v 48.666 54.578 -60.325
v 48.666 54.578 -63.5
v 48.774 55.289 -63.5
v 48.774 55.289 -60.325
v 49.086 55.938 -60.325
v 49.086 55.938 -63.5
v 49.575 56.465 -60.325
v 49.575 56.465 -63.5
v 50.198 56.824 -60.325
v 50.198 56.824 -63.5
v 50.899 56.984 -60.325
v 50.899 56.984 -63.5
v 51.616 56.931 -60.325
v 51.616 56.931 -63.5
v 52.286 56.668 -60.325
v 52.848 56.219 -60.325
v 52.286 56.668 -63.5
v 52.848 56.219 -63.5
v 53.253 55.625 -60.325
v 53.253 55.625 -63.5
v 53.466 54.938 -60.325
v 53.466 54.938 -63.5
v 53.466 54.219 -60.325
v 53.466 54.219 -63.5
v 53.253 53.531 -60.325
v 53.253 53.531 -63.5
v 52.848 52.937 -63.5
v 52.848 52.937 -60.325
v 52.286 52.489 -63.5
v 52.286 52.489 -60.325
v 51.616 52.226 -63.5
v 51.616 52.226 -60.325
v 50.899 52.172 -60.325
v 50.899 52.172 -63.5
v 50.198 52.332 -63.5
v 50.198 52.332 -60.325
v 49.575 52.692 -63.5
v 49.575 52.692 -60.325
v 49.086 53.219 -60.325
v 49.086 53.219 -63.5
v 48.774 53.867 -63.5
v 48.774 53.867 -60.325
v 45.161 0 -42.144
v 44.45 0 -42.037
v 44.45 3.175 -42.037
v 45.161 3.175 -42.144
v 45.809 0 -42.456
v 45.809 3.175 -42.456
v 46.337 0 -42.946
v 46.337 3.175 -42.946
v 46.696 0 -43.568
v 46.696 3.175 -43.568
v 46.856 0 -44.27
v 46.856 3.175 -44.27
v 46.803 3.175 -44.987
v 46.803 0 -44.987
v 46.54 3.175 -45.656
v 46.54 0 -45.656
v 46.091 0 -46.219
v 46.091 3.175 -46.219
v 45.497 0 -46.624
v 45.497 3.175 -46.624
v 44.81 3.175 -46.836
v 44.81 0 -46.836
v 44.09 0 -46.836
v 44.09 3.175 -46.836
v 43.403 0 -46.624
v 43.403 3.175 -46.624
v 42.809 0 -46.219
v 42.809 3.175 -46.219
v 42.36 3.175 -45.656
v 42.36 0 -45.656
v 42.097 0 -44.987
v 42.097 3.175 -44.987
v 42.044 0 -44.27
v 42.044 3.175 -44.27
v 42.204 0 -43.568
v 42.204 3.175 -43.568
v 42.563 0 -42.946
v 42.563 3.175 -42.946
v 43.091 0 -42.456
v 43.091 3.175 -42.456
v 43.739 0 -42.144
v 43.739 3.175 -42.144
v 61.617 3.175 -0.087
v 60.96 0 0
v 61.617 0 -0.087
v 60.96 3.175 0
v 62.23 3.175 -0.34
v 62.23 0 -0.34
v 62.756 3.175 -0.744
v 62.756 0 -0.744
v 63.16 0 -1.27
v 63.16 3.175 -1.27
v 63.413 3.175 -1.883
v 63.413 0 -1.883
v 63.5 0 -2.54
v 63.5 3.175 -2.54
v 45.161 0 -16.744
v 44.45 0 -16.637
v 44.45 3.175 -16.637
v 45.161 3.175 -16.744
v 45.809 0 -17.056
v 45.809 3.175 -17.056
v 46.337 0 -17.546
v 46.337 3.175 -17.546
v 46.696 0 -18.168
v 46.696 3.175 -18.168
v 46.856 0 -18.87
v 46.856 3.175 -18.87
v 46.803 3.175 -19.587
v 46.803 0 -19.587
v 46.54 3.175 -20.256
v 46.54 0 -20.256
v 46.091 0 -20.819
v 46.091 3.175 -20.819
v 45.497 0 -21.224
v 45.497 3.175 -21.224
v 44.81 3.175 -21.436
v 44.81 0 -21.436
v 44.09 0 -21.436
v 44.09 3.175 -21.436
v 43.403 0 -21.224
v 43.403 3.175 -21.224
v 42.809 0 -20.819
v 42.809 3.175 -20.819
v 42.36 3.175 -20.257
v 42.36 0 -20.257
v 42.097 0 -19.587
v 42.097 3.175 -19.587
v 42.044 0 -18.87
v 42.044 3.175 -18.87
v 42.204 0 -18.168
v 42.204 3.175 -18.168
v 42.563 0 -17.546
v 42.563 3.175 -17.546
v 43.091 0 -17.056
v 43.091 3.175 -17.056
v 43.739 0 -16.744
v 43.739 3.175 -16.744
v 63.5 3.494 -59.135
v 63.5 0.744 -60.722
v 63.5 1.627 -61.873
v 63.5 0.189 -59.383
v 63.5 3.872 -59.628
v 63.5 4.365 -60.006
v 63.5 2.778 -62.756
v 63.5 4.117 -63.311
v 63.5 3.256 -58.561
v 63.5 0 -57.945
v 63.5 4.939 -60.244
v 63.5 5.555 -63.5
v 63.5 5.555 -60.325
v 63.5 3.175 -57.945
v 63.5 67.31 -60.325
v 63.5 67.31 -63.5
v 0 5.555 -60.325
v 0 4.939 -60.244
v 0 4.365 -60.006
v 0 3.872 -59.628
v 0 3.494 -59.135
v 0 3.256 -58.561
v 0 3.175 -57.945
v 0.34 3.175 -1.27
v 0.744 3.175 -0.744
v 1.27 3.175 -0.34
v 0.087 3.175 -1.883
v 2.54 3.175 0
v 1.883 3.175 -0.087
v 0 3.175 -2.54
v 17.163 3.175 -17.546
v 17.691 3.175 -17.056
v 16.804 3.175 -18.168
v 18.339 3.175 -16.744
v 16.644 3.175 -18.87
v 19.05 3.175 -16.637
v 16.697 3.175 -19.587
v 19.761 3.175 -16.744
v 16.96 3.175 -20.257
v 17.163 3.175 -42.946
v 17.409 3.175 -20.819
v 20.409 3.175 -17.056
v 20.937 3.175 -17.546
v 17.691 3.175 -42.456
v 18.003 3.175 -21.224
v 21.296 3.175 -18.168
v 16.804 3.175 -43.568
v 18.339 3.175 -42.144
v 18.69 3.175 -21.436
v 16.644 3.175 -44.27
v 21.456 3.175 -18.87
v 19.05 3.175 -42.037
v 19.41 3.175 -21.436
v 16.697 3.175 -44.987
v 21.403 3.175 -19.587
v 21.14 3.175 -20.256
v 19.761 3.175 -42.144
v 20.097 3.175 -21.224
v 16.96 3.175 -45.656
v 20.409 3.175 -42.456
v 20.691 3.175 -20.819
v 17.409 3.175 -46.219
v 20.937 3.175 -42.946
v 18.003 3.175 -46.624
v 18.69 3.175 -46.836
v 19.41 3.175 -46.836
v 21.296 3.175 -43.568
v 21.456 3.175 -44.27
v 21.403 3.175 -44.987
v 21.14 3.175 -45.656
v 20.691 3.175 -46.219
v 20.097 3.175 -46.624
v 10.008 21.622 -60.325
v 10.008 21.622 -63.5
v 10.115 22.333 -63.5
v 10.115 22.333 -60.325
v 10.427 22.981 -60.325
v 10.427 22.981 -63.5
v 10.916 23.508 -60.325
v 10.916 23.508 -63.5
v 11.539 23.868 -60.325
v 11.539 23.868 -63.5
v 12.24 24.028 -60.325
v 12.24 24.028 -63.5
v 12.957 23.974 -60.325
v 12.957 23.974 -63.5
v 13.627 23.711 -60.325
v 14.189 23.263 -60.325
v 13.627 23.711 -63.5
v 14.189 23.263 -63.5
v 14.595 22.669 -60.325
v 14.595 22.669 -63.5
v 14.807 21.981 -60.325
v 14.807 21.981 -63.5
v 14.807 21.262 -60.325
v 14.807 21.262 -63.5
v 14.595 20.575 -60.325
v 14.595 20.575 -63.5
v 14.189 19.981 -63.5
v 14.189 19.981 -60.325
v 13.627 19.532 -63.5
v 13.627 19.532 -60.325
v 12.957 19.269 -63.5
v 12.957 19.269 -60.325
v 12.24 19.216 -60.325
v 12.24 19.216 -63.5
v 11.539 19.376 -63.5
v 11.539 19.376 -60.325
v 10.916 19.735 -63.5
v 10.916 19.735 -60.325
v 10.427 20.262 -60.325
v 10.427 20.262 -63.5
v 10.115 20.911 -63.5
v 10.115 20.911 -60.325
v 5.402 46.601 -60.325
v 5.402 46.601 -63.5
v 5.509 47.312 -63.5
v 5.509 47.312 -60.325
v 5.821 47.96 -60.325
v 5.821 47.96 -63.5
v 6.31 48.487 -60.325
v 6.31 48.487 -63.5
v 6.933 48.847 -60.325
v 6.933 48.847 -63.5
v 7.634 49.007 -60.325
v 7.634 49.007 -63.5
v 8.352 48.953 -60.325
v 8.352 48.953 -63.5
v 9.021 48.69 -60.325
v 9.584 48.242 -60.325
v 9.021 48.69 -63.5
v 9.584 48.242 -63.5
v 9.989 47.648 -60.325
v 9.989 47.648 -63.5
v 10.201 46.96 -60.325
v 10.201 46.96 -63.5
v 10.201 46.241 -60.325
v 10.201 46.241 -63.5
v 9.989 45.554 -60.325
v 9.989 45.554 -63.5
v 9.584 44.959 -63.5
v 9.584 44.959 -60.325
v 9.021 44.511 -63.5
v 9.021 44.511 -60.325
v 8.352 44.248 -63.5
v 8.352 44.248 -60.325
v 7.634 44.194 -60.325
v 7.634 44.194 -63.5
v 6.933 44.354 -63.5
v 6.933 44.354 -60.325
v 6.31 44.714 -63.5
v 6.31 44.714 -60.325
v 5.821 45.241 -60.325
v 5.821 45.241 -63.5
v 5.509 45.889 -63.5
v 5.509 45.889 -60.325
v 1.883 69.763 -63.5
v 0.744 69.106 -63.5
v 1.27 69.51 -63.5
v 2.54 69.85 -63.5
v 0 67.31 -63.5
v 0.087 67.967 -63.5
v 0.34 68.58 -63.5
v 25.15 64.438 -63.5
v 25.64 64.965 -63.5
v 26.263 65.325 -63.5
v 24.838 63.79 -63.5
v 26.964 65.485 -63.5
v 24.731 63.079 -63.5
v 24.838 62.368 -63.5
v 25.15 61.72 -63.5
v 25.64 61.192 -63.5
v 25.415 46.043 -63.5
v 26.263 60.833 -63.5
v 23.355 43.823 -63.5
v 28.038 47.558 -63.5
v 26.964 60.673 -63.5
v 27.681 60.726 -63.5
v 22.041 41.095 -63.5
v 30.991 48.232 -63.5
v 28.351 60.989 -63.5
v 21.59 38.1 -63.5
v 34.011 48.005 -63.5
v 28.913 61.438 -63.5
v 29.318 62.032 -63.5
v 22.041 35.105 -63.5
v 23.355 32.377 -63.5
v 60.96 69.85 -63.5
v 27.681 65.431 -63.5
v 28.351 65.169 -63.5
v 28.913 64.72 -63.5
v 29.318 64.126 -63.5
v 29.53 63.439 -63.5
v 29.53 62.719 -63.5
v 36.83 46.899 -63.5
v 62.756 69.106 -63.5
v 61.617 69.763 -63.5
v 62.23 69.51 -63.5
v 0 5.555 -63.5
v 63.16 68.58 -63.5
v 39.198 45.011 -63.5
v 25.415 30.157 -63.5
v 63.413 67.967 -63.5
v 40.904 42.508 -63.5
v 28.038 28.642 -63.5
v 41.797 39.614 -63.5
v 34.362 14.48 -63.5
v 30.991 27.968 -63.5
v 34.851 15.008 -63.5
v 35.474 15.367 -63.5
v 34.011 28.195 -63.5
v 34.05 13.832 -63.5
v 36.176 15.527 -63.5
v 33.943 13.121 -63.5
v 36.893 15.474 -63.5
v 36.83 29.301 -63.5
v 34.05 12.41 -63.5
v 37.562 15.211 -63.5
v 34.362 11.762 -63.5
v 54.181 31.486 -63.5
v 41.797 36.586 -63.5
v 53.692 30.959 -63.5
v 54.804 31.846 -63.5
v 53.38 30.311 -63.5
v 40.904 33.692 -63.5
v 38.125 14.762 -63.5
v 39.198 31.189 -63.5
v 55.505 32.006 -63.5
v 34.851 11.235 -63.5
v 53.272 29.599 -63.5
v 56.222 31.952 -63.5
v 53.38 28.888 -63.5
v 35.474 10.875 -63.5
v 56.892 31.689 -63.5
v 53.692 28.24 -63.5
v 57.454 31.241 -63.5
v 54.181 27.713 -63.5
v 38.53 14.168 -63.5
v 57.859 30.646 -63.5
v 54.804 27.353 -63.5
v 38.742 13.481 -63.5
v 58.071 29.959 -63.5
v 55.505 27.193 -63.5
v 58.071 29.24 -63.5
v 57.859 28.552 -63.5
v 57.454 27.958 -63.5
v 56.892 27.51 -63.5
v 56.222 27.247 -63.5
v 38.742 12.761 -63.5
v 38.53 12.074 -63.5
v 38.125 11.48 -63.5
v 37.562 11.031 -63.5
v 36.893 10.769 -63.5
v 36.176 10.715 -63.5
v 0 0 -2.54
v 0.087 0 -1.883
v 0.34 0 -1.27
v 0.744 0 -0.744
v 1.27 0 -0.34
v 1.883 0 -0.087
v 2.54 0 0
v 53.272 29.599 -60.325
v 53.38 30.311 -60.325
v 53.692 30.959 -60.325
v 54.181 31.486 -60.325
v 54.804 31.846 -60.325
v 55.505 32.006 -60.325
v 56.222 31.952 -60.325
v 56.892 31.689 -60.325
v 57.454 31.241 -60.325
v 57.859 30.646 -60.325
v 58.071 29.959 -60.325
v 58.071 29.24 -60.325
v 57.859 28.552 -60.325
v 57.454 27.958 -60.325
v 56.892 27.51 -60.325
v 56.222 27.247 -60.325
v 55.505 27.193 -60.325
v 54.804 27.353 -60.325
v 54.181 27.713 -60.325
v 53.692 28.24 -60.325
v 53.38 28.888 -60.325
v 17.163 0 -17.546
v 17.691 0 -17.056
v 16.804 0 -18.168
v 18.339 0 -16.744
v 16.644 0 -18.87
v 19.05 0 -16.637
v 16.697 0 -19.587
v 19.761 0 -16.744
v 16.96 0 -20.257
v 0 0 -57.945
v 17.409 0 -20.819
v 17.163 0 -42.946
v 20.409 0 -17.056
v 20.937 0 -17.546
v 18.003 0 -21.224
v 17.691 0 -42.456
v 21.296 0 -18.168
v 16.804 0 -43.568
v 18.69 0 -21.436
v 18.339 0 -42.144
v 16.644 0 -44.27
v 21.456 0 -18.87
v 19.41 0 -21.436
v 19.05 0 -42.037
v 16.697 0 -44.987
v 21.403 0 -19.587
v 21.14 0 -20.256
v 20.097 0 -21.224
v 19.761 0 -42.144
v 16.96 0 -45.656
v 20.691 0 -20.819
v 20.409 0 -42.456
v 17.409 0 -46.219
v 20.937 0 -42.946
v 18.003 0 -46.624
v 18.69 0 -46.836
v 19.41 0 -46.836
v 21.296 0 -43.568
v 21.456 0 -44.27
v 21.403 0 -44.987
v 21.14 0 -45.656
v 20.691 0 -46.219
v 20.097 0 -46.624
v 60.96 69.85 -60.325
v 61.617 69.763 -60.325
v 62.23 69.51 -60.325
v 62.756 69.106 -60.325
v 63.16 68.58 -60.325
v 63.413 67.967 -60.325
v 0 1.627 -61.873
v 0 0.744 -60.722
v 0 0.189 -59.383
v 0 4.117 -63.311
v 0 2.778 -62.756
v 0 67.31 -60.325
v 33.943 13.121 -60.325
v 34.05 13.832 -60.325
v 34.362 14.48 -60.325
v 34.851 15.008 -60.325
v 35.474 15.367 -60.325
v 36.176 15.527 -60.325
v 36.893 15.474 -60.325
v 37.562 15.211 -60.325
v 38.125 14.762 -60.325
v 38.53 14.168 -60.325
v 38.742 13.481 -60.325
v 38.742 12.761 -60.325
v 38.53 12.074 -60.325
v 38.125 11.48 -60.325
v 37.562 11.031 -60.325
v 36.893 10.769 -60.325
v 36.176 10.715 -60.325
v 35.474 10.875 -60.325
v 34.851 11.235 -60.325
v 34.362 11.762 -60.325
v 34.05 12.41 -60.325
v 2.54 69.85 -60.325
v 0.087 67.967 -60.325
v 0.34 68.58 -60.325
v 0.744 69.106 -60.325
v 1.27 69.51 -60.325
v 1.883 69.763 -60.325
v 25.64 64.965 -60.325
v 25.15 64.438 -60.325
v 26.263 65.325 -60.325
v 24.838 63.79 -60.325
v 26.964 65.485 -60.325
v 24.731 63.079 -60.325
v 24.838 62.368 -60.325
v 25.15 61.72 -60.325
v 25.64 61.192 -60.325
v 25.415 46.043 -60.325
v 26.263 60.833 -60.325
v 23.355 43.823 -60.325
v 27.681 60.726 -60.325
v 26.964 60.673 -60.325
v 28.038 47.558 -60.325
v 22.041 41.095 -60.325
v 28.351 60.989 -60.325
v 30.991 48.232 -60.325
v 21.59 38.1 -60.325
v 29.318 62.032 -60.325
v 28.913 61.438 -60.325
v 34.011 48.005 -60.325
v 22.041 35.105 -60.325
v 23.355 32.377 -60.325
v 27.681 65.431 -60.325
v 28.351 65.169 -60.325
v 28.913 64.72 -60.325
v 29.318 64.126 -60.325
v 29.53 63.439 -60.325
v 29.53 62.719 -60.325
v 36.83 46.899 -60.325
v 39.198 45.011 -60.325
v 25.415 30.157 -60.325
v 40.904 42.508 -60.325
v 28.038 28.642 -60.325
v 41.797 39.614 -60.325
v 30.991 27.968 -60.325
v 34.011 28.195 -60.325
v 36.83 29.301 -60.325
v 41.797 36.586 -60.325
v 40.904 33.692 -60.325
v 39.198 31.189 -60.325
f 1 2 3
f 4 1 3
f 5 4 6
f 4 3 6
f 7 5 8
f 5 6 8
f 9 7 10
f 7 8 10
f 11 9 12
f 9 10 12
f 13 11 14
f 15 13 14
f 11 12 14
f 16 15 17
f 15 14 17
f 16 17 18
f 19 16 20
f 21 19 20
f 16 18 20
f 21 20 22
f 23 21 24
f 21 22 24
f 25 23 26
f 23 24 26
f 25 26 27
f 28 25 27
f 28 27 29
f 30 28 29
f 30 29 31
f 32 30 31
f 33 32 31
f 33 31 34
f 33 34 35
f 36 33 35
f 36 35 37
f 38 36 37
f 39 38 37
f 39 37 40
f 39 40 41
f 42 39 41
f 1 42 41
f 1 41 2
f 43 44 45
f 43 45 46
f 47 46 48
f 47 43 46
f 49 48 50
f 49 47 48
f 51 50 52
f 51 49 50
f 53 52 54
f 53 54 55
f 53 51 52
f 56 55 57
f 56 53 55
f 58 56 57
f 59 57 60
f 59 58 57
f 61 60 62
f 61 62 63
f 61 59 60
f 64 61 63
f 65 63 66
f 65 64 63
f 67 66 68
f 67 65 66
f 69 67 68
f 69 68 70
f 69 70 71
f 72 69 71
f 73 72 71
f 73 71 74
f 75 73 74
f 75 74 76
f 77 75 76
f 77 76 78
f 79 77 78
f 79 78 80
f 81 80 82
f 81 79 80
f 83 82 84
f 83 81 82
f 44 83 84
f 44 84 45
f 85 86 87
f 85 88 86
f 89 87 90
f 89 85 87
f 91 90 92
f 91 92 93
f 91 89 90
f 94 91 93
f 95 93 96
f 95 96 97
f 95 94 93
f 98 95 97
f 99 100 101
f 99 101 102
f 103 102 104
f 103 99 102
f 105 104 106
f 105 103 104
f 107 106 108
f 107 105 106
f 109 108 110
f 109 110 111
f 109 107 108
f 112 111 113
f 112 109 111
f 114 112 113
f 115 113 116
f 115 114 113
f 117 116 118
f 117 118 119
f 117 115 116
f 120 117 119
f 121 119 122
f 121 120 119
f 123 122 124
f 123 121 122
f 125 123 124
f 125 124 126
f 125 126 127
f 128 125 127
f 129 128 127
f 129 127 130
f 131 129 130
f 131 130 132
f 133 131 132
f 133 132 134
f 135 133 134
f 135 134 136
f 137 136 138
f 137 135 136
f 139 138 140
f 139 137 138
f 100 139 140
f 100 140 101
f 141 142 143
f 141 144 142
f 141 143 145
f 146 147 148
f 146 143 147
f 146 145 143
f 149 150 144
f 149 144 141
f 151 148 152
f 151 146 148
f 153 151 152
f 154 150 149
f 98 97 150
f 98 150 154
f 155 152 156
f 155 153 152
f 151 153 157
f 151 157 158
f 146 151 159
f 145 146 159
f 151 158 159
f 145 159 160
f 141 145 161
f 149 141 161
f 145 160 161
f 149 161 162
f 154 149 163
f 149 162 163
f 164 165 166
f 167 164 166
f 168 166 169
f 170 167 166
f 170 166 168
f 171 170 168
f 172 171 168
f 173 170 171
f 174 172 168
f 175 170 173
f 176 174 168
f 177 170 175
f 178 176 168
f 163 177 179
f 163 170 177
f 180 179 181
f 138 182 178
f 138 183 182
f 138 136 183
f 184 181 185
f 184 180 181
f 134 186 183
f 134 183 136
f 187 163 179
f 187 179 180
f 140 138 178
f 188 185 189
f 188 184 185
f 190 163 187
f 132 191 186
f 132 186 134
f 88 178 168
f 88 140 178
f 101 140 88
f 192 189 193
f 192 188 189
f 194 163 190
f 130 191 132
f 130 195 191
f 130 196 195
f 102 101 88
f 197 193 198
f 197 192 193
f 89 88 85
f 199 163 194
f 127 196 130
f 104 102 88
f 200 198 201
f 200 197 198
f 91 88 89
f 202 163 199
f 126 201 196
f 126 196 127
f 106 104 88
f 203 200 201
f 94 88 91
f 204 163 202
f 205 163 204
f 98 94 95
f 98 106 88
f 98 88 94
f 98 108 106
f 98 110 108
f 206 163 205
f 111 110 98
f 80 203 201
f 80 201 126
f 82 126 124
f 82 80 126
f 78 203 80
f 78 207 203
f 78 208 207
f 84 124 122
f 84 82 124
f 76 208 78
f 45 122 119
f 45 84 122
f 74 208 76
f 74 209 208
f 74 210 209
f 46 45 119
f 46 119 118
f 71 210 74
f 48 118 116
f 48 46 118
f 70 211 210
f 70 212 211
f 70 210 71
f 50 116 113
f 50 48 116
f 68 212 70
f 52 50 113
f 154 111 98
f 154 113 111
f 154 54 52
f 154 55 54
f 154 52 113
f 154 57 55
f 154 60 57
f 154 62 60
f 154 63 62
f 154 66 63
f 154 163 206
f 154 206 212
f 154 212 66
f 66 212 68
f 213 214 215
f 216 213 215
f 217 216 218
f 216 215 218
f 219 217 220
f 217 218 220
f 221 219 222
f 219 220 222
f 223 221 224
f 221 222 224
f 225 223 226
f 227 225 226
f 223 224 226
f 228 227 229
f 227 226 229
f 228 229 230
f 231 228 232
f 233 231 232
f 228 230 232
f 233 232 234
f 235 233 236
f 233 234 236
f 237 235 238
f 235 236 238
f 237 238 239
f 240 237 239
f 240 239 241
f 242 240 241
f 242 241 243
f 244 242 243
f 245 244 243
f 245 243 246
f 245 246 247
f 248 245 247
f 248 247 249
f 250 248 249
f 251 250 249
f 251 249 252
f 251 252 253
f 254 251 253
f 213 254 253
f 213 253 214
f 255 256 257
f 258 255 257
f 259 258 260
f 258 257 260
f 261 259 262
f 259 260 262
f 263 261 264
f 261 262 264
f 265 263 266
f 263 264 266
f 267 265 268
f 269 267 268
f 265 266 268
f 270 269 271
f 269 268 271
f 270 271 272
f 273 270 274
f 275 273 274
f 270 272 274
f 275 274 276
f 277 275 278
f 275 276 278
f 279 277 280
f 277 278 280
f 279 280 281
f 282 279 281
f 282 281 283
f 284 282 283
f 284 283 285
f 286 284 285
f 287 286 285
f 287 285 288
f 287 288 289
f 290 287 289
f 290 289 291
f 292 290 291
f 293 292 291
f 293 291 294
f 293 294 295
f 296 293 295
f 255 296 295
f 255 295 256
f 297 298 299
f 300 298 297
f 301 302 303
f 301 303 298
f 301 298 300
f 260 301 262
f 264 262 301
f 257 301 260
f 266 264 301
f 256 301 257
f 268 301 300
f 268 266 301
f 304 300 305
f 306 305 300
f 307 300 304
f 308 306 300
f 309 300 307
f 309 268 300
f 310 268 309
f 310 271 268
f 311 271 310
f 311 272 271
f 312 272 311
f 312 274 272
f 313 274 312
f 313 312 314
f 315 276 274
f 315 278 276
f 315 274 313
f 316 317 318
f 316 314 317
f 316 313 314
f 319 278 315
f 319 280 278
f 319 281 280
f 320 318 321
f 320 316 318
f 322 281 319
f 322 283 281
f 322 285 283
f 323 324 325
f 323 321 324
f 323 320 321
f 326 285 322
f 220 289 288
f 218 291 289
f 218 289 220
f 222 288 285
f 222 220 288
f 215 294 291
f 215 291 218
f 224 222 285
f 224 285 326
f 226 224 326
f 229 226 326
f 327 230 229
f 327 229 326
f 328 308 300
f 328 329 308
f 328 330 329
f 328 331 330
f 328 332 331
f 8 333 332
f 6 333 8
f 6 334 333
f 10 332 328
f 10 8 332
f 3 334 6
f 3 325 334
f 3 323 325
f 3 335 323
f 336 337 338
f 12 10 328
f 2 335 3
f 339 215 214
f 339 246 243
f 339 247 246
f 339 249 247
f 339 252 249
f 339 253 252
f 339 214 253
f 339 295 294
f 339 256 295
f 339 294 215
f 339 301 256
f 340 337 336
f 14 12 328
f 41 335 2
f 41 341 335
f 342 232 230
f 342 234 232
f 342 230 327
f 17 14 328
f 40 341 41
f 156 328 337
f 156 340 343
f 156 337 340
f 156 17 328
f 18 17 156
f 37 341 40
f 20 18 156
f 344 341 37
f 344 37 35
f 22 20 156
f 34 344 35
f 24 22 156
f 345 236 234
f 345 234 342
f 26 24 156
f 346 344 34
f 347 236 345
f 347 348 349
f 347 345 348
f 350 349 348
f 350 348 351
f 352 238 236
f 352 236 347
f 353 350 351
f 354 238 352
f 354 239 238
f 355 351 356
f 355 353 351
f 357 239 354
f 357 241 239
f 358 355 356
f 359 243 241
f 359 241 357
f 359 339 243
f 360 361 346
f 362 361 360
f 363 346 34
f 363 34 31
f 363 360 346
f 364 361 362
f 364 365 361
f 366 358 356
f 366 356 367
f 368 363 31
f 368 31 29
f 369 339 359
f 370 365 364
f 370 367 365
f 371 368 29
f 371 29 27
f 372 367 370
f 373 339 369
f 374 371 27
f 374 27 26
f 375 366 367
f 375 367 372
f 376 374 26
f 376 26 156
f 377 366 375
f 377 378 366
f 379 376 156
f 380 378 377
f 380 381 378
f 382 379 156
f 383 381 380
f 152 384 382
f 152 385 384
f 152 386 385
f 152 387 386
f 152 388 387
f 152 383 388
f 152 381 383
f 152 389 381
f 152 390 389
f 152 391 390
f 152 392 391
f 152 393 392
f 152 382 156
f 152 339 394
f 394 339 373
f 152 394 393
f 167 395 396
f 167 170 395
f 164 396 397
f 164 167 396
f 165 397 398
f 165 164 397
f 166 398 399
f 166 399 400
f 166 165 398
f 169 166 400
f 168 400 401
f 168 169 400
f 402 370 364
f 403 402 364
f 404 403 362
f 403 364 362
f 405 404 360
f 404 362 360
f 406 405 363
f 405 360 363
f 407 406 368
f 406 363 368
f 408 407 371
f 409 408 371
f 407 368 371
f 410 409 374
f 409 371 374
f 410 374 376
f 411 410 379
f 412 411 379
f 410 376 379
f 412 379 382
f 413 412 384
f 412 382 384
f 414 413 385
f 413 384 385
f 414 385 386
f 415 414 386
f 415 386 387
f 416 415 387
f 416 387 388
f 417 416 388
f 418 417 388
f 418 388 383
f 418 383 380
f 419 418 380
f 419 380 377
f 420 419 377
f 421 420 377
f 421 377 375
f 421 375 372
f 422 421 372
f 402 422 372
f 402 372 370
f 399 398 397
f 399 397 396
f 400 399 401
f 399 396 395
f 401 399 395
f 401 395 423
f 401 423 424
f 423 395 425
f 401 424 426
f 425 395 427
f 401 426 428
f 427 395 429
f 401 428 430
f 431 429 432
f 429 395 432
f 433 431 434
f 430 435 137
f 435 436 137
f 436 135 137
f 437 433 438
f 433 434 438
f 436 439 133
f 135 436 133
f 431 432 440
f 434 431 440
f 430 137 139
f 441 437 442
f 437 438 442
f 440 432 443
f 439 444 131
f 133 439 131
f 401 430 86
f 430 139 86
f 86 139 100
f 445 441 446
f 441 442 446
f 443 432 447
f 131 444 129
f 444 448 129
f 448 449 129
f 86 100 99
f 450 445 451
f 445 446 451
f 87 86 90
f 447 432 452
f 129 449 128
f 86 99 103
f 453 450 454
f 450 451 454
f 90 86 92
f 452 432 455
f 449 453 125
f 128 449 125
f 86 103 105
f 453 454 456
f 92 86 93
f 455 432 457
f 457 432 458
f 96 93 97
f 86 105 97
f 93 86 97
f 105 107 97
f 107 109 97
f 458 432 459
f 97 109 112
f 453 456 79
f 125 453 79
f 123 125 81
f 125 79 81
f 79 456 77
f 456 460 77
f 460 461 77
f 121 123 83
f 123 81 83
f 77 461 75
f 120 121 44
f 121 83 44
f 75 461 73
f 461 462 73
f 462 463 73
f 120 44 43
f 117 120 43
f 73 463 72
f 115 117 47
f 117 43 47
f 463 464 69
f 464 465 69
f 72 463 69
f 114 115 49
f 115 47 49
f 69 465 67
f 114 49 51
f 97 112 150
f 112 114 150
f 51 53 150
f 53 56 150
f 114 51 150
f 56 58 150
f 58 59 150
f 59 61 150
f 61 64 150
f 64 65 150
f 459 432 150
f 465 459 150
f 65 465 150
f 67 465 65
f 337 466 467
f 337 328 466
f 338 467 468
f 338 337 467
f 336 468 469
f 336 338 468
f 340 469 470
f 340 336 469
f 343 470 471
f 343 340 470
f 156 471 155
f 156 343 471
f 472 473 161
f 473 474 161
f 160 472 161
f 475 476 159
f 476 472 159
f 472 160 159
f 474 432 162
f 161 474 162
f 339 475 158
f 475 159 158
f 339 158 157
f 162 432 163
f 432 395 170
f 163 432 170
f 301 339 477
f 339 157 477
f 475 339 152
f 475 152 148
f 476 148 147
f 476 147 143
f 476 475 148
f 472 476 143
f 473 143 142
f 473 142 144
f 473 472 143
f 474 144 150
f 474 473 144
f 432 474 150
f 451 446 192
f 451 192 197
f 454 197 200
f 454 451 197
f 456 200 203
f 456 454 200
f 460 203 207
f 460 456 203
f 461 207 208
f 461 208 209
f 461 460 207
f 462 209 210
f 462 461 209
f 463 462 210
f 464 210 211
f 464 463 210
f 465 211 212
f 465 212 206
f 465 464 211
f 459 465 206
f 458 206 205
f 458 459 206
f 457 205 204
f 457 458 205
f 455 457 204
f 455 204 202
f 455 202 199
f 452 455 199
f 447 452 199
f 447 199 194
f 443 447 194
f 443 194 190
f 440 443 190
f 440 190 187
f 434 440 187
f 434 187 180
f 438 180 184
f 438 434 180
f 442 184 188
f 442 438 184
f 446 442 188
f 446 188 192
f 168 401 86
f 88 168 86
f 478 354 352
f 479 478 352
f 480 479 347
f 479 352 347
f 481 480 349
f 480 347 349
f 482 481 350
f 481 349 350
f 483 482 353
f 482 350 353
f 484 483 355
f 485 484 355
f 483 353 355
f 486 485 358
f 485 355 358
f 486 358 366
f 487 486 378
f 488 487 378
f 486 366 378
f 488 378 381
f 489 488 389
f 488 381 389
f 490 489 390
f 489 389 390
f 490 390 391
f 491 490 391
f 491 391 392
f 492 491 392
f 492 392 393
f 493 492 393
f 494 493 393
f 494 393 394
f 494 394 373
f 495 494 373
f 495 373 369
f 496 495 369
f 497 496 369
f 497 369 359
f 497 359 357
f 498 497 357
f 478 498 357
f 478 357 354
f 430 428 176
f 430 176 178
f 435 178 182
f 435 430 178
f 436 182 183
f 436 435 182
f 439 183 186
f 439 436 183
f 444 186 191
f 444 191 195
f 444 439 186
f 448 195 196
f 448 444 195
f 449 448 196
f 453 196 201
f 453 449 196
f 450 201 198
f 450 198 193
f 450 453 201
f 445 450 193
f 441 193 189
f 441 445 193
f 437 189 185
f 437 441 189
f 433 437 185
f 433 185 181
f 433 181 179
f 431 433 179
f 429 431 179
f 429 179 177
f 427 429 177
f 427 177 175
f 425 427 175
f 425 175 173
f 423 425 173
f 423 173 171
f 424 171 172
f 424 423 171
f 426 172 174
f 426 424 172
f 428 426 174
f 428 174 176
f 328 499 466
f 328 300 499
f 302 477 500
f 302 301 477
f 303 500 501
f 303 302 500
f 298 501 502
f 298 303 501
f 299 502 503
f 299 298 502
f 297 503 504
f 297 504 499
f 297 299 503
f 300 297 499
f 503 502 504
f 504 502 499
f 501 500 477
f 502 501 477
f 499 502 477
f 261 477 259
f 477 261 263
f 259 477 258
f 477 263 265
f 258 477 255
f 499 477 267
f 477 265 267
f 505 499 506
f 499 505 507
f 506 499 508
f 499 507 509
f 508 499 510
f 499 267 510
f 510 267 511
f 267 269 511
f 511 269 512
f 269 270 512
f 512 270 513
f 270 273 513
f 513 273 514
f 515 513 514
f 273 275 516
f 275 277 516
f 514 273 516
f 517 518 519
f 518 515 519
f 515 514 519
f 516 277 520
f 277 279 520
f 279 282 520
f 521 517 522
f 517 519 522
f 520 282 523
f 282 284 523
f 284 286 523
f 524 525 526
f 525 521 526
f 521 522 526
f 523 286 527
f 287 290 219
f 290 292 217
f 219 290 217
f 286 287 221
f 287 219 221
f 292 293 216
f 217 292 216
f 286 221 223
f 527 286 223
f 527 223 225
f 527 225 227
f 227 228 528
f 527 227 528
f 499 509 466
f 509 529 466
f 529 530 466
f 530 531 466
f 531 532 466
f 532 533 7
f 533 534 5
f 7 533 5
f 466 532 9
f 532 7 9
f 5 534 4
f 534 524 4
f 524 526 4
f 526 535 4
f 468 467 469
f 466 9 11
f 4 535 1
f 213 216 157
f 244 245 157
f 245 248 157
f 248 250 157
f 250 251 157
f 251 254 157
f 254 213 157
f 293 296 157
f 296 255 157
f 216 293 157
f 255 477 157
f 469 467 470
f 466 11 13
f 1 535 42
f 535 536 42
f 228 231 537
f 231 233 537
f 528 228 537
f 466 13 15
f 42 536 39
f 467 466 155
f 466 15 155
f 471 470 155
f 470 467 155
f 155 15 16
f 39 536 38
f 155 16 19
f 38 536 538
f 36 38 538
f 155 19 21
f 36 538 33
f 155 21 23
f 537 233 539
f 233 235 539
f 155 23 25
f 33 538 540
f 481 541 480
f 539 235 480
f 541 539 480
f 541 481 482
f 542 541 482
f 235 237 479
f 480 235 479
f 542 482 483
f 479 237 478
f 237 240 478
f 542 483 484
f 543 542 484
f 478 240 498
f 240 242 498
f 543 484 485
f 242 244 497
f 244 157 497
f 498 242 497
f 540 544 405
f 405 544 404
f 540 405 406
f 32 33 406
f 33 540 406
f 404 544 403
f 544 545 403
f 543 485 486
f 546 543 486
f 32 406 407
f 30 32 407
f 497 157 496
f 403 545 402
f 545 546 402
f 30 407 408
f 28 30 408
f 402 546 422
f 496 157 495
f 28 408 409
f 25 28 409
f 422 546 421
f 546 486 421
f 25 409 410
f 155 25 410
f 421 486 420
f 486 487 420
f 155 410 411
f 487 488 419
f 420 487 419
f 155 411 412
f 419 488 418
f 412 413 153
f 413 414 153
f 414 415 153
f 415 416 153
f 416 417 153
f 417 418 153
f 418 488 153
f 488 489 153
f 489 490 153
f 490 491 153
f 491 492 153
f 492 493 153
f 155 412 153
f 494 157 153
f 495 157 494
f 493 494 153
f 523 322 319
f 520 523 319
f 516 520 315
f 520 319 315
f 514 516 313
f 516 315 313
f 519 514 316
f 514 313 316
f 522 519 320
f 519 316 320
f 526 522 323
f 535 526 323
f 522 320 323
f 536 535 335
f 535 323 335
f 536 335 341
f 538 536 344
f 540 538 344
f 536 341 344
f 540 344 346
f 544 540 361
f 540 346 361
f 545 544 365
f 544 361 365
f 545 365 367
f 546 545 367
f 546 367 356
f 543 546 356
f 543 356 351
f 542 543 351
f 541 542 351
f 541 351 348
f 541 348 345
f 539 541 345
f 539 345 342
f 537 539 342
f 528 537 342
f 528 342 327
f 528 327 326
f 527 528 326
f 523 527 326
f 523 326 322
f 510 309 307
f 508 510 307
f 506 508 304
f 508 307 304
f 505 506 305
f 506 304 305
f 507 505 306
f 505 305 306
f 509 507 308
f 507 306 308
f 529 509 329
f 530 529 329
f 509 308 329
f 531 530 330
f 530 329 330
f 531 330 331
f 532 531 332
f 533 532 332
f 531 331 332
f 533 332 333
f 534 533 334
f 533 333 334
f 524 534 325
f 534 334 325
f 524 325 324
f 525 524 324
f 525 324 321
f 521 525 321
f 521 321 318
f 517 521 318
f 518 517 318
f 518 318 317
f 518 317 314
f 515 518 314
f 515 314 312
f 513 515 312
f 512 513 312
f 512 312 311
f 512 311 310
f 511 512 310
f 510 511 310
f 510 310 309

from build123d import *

# Parameters (mm, degrees)
SKETCH1_W              = 63.5
SKETCH1_H              = 63.5
SKETCH1_R              = 2.413
BOSS_EXTRUDE1_DEPTH    = 3.175
SKETCH2_W              = 63.5
SKETCH2_H              = 3.175
BOSS_EXTRUDE2_DEPTH    = 66.675
SKETCH3_R              = 10.16
SKETCH3_R_2            = 2.413
CUT_EXTRUDE2_DEPTH     = 60.325
FILLET1_R              = 2.54
CONVERT_SOLID1_DEPTH   = 63.5
CONVERT_SOLID1_2_DEPTH = 63.5


# Read off the part's stored shape, not the designer's step: Convert-Solid1
with BuildPart() as part:
    # Sketch1 → Boss-Extrude1 (new body)
    with BuildSketch(Plane(origin=(0, 0, 0), x_dir=(1, 0, 0), z_dir=(0, 1, 0))):
        with Locations((31.75, 31.75)):
            Rectangle(SKETCH1_W, SKETCH1_H)
        with Locations(Location((19.05, 44.45, 0), (0, 0, 270))):
            Circle(SKETCH1_R, mode=Mode.SUBTRACT)
        with Locations(Location((44.45, 44.45, 0), (0, 0, 270))):
            Circle(SKETCH1_R, mode=Mode.SUBTRACT)
        with Locations(Location((19.05, 19.05, 0), (0, 0, 270))):
            Circle(SKETCH1_R, mode=Mode.SUBTRACT)
        with Locations(Location((44.45, 19.05, 0), (0, 0, 270))):
            Circle(SKETCH1_R, mode=Mode.SUBTRACT)
    extrude(amount=BOSS_EXTRUDE1_DEPTH)

    # Sketch2 → Boss-Extrude2 (add)
    with BuildSketch(Plane(origin=(0, 3.175, 0), x_dir=(1, 0, 0), z_dir=(0, 1, 0))):
        with Locations((31.75, 61.9125)):
            Rectangle(SKETCH2_W, SKETCH2_H)
    extrude(amount=BOSS_EXTRUDE2_DEPTH)

    # Sketch3 → Cut-Extrude2 (cut)
    with BuildSketch(Plane(origin=(0, 0, -63.5), x_dir=(-1, 0, 0), z_dir=(0, 0, -1))):
        with Locations((-31.75, 38.1)):
            Circle(SKETCH3_R)
        with Locations((-27.144154857, 63.078914919)):
            Circle(SKETCH3_R_2)
        with Locations((-7.81470255, 46.600678559)):
            Circle(SKETCH3_R_2)
        with Locations((-12.420547693, 21.621763641)):
            Circle(SKETCH3_R_2)
        with Locations((-36.355845143, 13.121085081)):
            Circle(SKETCH3_R_2)
        with Locations((-55.68529745, 29.599321441)):
            Circle(SKETCH3_R_2)
        with Locations((-51.079452307, 54.578236359)):
            Circle(SKETCH3_R_2)
    extrude(amount=-CUT_EXTRUDE2_DEPTH, mode=Mode.SUBTRACT)

    # Fillet1
    fillet1_edges = [part.edges().sort_by_distance(p)[0] for p in [
        (0, 69.85, -61.9125),
        (63.5, 69.85, -61.9125),
        (63.5, 1.5875, 0),
        (0, 1.5875, 0),
    ]]
    fillet(fillet1_edges, radius=FILLET1_R)

    # Convert-Solid1 outline → Convert-Solid1 (cut)
    with BuildSketch(Plane.YZ):
        with BuildLine():
            Line((0, -63.5), (5.555000066, -63.5))
            ThreePointArc((5.555000066, -63.5), (1.62702185, -61.87297815), (0, -57.944999934))
            Line((0, -57.944999934), (0, -63.5))
        make_face()
    extrude(amount=CONVERT_SOLID1_DEPTH, mode=Mode.SUBTRACT)

    # Convert-Solid1 2 outline → Convert-Solid1 2 (add)
    with BuildSketch(Plane.YZ):
        with BuildLine():
            Line((3.175, -60.325), (5.555000066, -60.325))
            ThreePointArc((5.555000066, -60.325), (3.87208588, -59.62791412), (3.175, -57.944999934))
            Line((3.175, -57.944999934), (3.175, -60.325))
        make_face()
    extrude(amount=CONVERT_SOLID1_2_DEPTH)


solid = part.part
